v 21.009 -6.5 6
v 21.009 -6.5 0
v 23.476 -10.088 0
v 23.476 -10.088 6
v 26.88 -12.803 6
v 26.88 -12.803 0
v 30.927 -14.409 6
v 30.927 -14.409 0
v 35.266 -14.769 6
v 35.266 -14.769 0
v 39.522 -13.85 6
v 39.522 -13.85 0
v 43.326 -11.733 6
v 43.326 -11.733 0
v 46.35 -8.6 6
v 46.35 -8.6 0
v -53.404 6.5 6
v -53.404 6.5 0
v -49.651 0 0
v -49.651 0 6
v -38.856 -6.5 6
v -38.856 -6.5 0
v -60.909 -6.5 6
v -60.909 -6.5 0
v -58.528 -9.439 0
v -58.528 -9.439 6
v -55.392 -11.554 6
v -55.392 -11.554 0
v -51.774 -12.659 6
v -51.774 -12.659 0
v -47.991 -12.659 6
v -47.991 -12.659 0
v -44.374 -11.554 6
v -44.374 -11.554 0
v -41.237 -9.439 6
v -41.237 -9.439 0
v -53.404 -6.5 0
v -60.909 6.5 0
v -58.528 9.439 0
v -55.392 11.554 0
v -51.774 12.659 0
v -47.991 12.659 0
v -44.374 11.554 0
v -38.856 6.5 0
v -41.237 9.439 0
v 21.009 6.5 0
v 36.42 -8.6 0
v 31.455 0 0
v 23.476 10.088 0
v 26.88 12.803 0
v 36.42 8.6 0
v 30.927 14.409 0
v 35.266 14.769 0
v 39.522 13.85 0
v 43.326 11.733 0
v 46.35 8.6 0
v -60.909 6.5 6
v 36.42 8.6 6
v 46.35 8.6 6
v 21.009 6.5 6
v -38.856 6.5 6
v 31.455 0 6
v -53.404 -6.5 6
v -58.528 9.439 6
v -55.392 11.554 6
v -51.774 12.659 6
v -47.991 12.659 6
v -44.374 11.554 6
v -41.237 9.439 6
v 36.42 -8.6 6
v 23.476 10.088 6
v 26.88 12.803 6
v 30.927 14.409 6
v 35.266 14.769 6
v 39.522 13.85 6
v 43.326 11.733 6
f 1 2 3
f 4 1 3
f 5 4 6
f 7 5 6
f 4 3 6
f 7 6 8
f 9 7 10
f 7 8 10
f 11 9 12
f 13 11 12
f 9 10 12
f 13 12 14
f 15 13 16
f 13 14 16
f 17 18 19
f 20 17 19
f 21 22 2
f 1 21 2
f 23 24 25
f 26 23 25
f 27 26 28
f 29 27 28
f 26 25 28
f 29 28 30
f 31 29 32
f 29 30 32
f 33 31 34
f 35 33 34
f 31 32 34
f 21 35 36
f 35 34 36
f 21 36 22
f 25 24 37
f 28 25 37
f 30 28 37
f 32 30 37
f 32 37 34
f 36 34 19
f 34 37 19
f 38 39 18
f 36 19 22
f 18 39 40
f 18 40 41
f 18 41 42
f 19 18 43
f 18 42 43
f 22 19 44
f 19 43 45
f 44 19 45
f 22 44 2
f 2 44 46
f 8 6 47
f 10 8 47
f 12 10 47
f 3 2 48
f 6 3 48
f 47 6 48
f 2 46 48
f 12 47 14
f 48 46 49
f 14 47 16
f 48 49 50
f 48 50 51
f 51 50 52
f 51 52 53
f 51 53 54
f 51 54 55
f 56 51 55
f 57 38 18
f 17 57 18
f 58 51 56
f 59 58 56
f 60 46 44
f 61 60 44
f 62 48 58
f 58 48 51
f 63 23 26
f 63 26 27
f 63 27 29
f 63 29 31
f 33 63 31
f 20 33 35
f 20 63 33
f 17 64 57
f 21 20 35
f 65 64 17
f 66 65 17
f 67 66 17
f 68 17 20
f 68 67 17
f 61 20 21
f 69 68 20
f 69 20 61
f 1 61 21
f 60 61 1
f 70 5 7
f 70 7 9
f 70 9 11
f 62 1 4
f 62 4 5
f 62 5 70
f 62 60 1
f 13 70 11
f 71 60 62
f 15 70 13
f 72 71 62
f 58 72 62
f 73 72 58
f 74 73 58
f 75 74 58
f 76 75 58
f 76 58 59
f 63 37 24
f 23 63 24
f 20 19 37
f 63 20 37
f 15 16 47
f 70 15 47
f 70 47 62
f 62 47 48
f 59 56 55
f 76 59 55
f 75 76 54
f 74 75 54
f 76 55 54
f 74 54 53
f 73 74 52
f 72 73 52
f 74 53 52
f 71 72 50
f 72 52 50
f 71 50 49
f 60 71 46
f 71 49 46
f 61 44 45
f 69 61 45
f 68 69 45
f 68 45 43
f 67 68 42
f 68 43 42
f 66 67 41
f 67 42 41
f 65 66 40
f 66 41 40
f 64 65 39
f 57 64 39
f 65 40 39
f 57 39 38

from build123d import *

# Parameters (mm, degrees)
F1_DEPTH = 6


with BuildPart() as f1:
    # F0 (on Top) → F1 (new body)
    with BuildSketch(Plane.XY):
        with BuildLine():
            Line((-49.6510066098, 0), (-49.6510066098, 6.5))
            Line((-49.6510066098, 6.5), (-38.8557657197, 6.5))
            ThreePointArc((-38.8557657197, 6.5), (-49.8825512893, 12.8), (-60.909336859, 6.5))
            Line((-60.909336859, 6.5), (-53.4037833596, 6.5))
            Line((-53.4037833596, 6.5), (-49.6510066098, 0))
        make_face()
        with BuildLine():
            Line((-38.8557657197, 6.5), (-49.6510066098, 6.5))
            Line((-49.6510066098, 6.5), (-49.6510066098, 0))
            Line((-49.6510066098, 0), (-49.6510066098, -6.5))
            Line((-49.6510066098, -6.5), (-38.8557657197, -6.5))
            ThreePointArc((-38.8557657197, -6.5), (-37.5338093435, -3.3687642176), (-37.0825512893, 0))
            ThreePointArc((-37.0825512893, 0), (-37.5338093435, 3.3687642176), (-38.8557657197, 6.5))
        make_face()
        with BuildLine():
            Line((-49.6510066098, -6.5), (-49.6510066098, 0))
            Line((-49.6510066098, 0), (-53.4037833596, -6.5))
            Line((-53.4037833596, -6.5), (-60.909336859, -6.5))
            ThreePointArc((-60.909336859, -6.5), (-49.8825512893, -12.8), (-38.8557657197, -6.5))
            Line((-38.8557657197, -6.5), (-49.6510066098, -6.5))
        make_face()
        with BuildLine():
            Line((21.0090092811, 6.5), (-38.8557657197, 6.5))
            ThreePointArc((-38.8557657197, 6.5), (-37.5338093435, 3.3687642176), (-37.0825512893, 0))
            ThreePointArc((-37.0825512893, 0), (-37.5338093435, -3.3687642176), (-38.8557657197, -6.5))
            Line((-38.8557657197, -6.5), (21.0090092811, -6.5))
            ThreePointArc((21.0090092811, -6.5), (19.5052493512, 0), (21.0090092811, 6.5))
        make_face()
        with BuildLine():
            ThreePointArc((46.3501652911, 8.6), (33.0829756422, 14.74944226), (21.0090092811, 6.5))
            Line((21.0090092811, 6.5), (31.454528346, 6.5))
            Line((31.454528346, 6.5), (31.454528346, 0))
            Line((31.454528346, 0), (36.419740661, 8.6))
            Line((36.419740661, 8.6), (46.3501652911, 8.6))
        make_face()
        with BuildLine():
            Line((31.454528346, 6.5), (21.0090092811, 6.5))
            ThreePointArc((21.0090092811, 6.5), (19.5052493512, 0), (21.0090092811, -6.5))
            Line((21.0090092811, -6.5), (31.454528346, -6.5))
            Line((31.454528346, -6.5), (31.454528346, 0))
            Line((31.454528346, 0), (31.454528346, 6.5))
        make_face()
        with BuildLine():
            Line((31.454528346, -6.5), (21.0090092811, -6.5))
            ThreePointArc((21.0090092811, -6.5), (33.0829756422, -14.74944226), (46.3501652911, -8.6))
            Line((46.3501652911, -8.6), (36.419740661, -8.6))
            Line((36.419740661, -8.6), (31.454528346, 0))
            Line((31.454528346, 0), (31.454528346, -6.5))
        make_face()
    extrude(amount=F1_DEPTH)


solid = f1.part
